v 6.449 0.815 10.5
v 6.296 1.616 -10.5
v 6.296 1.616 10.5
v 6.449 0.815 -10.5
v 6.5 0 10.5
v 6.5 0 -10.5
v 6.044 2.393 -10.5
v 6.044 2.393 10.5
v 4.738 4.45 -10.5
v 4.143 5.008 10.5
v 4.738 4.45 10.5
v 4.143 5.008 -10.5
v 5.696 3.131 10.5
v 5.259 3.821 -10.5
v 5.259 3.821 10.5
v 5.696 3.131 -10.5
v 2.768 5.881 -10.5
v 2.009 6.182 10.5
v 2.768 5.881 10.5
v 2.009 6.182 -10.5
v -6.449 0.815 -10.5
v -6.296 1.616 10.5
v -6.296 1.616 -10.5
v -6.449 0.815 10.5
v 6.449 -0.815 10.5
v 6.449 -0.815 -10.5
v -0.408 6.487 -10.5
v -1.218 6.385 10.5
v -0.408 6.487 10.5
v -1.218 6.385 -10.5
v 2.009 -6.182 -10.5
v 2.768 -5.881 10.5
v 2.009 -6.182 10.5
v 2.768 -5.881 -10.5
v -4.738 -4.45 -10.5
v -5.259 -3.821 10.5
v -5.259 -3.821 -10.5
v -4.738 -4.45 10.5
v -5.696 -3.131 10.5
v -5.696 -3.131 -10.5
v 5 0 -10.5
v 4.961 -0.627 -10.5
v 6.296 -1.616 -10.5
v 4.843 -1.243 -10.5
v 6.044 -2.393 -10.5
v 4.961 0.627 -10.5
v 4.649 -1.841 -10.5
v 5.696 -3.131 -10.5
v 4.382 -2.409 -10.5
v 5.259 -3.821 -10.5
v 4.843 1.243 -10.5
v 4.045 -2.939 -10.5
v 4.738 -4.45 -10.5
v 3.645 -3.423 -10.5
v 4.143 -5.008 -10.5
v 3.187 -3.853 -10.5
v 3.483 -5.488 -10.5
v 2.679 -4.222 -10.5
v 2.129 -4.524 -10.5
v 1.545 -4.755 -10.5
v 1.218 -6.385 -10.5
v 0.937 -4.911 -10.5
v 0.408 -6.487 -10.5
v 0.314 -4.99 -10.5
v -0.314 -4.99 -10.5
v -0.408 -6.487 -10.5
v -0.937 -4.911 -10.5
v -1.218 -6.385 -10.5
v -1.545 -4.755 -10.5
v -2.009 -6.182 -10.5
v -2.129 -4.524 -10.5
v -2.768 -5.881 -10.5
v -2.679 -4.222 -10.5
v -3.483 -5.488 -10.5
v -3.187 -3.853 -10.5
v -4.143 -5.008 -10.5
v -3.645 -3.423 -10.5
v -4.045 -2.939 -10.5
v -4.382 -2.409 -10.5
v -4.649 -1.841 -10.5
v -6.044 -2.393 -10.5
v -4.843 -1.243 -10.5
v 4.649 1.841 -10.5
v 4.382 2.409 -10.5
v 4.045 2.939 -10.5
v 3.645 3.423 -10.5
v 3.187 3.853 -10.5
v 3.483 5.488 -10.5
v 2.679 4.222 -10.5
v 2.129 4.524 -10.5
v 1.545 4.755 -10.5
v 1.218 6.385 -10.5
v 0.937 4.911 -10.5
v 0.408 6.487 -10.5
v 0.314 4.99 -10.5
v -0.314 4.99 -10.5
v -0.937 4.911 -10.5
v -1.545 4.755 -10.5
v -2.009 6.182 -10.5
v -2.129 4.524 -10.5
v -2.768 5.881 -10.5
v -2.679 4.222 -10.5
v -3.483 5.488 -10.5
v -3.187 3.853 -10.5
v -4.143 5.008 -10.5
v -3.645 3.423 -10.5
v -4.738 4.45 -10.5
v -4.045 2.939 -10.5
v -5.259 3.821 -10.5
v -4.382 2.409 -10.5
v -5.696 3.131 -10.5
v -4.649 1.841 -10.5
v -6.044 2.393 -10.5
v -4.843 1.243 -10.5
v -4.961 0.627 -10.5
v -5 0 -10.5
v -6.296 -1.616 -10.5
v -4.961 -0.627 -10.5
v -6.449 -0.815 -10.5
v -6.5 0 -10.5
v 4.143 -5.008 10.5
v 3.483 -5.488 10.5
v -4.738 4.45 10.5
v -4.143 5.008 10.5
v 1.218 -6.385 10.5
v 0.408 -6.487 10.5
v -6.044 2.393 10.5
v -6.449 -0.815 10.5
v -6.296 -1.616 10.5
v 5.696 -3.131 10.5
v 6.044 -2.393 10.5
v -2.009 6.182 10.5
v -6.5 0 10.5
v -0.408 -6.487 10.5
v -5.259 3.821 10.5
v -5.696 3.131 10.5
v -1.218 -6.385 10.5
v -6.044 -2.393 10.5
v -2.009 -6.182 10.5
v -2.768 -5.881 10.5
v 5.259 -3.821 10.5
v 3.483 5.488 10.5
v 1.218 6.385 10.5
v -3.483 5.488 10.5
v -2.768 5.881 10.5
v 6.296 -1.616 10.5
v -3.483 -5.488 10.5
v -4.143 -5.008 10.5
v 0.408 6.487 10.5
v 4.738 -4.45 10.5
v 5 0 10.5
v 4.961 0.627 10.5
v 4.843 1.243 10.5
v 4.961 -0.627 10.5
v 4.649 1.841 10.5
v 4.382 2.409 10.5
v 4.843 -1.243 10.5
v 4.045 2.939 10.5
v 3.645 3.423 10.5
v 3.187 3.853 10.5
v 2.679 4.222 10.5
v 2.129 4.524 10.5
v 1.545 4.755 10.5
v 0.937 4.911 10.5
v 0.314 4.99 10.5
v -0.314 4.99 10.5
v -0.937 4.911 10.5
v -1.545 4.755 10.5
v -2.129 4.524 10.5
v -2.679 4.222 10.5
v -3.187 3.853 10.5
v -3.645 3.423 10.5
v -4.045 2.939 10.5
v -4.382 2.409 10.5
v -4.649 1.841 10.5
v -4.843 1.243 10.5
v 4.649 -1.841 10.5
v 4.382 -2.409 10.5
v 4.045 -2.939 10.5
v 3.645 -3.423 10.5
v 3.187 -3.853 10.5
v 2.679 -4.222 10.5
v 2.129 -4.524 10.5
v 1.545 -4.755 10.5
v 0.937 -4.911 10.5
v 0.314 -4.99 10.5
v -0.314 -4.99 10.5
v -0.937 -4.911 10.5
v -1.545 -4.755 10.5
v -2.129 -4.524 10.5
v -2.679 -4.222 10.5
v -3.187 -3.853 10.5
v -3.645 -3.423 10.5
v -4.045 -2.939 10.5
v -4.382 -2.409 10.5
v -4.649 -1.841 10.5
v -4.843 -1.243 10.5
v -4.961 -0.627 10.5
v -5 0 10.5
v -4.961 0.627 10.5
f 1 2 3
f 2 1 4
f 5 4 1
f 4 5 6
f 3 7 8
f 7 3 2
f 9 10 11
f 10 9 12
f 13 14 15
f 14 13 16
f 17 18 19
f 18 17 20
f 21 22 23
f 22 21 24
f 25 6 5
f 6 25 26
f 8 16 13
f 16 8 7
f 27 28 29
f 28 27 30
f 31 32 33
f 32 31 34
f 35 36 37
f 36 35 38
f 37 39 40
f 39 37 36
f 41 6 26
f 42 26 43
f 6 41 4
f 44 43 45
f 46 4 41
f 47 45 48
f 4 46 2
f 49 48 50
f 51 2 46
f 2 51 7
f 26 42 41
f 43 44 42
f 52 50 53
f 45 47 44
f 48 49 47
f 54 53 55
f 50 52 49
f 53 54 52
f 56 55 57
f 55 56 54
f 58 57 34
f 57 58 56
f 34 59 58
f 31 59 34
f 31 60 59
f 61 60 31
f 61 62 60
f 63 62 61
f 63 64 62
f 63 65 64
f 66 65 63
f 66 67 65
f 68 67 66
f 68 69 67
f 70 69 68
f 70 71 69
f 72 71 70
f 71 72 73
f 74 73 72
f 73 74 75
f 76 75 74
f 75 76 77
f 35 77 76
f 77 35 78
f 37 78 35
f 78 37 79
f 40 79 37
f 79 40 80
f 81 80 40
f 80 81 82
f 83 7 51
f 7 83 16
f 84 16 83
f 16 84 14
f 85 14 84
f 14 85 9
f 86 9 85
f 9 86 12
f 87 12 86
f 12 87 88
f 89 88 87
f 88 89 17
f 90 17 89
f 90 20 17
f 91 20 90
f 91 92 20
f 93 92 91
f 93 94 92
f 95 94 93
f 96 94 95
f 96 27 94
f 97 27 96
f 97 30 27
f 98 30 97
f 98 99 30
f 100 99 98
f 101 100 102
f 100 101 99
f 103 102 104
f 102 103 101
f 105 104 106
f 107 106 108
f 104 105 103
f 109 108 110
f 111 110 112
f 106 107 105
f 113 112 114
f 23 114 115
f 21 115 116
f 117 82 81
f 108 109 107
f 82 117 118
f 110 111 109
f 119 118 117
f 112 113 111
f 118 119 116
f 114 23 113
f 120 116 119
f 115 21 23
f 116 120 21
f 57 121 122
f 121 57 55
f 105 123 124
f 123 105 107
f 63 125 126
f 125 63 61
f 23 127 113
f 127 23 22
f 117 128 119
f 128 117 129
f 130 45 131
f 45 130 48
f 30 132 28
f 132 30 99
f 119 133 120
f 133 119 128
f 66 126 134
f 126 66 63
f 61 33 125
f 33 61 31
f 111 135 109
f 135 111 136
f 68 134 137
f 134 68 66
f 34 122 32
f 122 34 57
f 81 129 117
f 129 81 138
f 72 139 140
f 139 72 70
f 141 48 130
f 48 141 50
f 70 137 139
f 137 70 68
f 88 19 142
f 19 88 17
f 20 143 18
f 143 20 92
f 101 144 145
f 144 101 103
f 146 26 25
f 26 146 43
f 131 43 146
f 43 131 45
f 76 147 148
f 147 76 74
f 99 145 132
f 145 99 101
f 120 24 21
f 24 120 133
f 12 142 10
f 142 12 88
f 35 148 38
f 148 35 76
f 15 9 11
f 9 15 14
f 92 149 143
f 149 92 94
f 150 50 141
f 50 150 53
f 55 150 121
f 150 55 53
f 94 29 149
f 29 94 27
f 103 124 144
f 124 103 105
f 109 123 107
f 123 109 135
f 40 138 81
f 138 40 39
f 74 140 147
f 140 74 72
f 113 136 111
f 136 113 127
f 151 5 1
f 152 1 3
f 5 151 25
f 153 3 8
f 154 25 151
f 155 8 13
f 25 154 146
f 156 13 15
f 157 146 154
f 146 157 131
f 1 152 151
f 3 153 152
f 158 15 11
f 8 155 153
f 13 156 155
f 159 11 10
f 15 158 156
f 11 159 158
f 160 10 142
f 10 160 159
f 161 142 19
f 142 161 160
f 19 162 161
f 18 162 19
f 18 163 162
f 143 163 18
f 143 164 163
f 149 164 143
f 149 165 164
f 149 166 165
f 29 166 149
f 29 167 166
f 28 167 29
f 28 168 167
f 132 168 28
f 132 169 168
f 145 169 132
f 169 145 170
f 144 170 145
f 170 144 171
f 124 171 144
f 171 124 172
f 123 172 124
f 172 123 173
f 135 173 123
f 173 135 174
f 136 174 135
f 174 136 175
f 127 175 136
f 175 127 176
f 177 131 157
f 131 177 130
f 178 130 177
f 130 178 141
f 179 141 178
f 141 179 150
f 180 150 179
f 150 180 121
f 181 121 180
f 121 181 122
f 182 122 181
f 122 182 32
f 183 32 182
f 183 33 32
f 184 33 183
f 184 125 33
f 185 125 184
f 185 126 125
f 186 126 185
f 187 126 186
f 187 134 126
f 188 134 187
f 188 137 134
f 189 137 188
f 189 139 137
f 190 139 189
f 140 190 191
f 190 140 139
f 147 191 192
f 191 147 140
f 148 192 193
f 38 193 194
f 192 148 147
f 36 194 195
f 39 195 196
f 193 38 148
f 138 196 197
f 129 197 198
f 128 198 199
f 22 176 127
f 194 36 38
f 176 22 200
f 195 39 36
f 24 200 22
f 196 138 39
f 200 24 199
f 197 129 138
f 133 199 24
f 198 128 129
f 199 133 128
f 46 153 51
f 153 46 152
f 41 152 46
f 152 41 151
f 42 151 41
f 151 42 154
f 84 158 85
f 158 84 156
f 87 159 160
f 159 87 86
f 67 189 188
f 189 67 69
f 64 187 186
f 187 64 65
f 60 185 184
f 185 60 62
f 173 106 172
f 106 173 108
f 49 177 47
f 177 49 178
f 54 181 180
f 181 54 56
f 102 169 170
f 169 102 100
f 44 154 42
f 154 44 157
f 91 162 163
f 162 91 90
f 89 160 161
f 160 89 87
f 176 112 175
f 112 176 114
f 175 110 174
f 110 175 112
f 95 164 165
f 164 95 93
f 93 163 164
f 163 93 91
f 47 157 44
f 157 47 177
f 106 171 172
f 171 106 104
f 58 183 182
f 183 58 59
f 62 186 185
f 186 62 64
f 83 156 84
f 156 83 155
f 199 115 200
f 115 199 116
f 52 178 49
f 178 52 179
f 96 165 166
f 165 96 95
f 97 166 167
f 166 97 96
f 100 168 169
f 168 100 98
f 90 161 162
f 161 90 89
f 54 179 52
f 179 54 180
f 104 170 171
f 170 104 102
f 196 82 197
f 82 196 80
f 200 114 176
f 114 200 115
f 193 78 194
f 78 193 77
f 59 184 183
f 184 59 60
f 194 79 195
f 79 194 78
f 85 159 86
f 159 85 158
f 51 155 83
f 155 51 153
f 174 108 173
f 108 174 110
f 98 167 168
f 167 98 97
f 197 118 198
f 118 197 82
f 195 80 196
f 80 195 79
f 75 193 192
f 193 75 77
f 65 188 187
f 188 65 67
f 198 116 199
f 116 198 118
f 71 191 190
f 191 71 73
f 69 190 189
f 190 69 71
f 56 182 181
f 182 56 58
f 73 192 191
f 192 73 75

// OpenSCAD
$fn = 50;


difference() {
	union() {
		translate(v = [0, 0, -10.5000000000]) {
			cylinder(h = 21, r = 6.5000000000);
		}
	}
	union() {
		translate(v = [0, 0, -100.0000000000]) {
			cylinder(h = 200, r = 5.0000000000);
		}
	}
}
